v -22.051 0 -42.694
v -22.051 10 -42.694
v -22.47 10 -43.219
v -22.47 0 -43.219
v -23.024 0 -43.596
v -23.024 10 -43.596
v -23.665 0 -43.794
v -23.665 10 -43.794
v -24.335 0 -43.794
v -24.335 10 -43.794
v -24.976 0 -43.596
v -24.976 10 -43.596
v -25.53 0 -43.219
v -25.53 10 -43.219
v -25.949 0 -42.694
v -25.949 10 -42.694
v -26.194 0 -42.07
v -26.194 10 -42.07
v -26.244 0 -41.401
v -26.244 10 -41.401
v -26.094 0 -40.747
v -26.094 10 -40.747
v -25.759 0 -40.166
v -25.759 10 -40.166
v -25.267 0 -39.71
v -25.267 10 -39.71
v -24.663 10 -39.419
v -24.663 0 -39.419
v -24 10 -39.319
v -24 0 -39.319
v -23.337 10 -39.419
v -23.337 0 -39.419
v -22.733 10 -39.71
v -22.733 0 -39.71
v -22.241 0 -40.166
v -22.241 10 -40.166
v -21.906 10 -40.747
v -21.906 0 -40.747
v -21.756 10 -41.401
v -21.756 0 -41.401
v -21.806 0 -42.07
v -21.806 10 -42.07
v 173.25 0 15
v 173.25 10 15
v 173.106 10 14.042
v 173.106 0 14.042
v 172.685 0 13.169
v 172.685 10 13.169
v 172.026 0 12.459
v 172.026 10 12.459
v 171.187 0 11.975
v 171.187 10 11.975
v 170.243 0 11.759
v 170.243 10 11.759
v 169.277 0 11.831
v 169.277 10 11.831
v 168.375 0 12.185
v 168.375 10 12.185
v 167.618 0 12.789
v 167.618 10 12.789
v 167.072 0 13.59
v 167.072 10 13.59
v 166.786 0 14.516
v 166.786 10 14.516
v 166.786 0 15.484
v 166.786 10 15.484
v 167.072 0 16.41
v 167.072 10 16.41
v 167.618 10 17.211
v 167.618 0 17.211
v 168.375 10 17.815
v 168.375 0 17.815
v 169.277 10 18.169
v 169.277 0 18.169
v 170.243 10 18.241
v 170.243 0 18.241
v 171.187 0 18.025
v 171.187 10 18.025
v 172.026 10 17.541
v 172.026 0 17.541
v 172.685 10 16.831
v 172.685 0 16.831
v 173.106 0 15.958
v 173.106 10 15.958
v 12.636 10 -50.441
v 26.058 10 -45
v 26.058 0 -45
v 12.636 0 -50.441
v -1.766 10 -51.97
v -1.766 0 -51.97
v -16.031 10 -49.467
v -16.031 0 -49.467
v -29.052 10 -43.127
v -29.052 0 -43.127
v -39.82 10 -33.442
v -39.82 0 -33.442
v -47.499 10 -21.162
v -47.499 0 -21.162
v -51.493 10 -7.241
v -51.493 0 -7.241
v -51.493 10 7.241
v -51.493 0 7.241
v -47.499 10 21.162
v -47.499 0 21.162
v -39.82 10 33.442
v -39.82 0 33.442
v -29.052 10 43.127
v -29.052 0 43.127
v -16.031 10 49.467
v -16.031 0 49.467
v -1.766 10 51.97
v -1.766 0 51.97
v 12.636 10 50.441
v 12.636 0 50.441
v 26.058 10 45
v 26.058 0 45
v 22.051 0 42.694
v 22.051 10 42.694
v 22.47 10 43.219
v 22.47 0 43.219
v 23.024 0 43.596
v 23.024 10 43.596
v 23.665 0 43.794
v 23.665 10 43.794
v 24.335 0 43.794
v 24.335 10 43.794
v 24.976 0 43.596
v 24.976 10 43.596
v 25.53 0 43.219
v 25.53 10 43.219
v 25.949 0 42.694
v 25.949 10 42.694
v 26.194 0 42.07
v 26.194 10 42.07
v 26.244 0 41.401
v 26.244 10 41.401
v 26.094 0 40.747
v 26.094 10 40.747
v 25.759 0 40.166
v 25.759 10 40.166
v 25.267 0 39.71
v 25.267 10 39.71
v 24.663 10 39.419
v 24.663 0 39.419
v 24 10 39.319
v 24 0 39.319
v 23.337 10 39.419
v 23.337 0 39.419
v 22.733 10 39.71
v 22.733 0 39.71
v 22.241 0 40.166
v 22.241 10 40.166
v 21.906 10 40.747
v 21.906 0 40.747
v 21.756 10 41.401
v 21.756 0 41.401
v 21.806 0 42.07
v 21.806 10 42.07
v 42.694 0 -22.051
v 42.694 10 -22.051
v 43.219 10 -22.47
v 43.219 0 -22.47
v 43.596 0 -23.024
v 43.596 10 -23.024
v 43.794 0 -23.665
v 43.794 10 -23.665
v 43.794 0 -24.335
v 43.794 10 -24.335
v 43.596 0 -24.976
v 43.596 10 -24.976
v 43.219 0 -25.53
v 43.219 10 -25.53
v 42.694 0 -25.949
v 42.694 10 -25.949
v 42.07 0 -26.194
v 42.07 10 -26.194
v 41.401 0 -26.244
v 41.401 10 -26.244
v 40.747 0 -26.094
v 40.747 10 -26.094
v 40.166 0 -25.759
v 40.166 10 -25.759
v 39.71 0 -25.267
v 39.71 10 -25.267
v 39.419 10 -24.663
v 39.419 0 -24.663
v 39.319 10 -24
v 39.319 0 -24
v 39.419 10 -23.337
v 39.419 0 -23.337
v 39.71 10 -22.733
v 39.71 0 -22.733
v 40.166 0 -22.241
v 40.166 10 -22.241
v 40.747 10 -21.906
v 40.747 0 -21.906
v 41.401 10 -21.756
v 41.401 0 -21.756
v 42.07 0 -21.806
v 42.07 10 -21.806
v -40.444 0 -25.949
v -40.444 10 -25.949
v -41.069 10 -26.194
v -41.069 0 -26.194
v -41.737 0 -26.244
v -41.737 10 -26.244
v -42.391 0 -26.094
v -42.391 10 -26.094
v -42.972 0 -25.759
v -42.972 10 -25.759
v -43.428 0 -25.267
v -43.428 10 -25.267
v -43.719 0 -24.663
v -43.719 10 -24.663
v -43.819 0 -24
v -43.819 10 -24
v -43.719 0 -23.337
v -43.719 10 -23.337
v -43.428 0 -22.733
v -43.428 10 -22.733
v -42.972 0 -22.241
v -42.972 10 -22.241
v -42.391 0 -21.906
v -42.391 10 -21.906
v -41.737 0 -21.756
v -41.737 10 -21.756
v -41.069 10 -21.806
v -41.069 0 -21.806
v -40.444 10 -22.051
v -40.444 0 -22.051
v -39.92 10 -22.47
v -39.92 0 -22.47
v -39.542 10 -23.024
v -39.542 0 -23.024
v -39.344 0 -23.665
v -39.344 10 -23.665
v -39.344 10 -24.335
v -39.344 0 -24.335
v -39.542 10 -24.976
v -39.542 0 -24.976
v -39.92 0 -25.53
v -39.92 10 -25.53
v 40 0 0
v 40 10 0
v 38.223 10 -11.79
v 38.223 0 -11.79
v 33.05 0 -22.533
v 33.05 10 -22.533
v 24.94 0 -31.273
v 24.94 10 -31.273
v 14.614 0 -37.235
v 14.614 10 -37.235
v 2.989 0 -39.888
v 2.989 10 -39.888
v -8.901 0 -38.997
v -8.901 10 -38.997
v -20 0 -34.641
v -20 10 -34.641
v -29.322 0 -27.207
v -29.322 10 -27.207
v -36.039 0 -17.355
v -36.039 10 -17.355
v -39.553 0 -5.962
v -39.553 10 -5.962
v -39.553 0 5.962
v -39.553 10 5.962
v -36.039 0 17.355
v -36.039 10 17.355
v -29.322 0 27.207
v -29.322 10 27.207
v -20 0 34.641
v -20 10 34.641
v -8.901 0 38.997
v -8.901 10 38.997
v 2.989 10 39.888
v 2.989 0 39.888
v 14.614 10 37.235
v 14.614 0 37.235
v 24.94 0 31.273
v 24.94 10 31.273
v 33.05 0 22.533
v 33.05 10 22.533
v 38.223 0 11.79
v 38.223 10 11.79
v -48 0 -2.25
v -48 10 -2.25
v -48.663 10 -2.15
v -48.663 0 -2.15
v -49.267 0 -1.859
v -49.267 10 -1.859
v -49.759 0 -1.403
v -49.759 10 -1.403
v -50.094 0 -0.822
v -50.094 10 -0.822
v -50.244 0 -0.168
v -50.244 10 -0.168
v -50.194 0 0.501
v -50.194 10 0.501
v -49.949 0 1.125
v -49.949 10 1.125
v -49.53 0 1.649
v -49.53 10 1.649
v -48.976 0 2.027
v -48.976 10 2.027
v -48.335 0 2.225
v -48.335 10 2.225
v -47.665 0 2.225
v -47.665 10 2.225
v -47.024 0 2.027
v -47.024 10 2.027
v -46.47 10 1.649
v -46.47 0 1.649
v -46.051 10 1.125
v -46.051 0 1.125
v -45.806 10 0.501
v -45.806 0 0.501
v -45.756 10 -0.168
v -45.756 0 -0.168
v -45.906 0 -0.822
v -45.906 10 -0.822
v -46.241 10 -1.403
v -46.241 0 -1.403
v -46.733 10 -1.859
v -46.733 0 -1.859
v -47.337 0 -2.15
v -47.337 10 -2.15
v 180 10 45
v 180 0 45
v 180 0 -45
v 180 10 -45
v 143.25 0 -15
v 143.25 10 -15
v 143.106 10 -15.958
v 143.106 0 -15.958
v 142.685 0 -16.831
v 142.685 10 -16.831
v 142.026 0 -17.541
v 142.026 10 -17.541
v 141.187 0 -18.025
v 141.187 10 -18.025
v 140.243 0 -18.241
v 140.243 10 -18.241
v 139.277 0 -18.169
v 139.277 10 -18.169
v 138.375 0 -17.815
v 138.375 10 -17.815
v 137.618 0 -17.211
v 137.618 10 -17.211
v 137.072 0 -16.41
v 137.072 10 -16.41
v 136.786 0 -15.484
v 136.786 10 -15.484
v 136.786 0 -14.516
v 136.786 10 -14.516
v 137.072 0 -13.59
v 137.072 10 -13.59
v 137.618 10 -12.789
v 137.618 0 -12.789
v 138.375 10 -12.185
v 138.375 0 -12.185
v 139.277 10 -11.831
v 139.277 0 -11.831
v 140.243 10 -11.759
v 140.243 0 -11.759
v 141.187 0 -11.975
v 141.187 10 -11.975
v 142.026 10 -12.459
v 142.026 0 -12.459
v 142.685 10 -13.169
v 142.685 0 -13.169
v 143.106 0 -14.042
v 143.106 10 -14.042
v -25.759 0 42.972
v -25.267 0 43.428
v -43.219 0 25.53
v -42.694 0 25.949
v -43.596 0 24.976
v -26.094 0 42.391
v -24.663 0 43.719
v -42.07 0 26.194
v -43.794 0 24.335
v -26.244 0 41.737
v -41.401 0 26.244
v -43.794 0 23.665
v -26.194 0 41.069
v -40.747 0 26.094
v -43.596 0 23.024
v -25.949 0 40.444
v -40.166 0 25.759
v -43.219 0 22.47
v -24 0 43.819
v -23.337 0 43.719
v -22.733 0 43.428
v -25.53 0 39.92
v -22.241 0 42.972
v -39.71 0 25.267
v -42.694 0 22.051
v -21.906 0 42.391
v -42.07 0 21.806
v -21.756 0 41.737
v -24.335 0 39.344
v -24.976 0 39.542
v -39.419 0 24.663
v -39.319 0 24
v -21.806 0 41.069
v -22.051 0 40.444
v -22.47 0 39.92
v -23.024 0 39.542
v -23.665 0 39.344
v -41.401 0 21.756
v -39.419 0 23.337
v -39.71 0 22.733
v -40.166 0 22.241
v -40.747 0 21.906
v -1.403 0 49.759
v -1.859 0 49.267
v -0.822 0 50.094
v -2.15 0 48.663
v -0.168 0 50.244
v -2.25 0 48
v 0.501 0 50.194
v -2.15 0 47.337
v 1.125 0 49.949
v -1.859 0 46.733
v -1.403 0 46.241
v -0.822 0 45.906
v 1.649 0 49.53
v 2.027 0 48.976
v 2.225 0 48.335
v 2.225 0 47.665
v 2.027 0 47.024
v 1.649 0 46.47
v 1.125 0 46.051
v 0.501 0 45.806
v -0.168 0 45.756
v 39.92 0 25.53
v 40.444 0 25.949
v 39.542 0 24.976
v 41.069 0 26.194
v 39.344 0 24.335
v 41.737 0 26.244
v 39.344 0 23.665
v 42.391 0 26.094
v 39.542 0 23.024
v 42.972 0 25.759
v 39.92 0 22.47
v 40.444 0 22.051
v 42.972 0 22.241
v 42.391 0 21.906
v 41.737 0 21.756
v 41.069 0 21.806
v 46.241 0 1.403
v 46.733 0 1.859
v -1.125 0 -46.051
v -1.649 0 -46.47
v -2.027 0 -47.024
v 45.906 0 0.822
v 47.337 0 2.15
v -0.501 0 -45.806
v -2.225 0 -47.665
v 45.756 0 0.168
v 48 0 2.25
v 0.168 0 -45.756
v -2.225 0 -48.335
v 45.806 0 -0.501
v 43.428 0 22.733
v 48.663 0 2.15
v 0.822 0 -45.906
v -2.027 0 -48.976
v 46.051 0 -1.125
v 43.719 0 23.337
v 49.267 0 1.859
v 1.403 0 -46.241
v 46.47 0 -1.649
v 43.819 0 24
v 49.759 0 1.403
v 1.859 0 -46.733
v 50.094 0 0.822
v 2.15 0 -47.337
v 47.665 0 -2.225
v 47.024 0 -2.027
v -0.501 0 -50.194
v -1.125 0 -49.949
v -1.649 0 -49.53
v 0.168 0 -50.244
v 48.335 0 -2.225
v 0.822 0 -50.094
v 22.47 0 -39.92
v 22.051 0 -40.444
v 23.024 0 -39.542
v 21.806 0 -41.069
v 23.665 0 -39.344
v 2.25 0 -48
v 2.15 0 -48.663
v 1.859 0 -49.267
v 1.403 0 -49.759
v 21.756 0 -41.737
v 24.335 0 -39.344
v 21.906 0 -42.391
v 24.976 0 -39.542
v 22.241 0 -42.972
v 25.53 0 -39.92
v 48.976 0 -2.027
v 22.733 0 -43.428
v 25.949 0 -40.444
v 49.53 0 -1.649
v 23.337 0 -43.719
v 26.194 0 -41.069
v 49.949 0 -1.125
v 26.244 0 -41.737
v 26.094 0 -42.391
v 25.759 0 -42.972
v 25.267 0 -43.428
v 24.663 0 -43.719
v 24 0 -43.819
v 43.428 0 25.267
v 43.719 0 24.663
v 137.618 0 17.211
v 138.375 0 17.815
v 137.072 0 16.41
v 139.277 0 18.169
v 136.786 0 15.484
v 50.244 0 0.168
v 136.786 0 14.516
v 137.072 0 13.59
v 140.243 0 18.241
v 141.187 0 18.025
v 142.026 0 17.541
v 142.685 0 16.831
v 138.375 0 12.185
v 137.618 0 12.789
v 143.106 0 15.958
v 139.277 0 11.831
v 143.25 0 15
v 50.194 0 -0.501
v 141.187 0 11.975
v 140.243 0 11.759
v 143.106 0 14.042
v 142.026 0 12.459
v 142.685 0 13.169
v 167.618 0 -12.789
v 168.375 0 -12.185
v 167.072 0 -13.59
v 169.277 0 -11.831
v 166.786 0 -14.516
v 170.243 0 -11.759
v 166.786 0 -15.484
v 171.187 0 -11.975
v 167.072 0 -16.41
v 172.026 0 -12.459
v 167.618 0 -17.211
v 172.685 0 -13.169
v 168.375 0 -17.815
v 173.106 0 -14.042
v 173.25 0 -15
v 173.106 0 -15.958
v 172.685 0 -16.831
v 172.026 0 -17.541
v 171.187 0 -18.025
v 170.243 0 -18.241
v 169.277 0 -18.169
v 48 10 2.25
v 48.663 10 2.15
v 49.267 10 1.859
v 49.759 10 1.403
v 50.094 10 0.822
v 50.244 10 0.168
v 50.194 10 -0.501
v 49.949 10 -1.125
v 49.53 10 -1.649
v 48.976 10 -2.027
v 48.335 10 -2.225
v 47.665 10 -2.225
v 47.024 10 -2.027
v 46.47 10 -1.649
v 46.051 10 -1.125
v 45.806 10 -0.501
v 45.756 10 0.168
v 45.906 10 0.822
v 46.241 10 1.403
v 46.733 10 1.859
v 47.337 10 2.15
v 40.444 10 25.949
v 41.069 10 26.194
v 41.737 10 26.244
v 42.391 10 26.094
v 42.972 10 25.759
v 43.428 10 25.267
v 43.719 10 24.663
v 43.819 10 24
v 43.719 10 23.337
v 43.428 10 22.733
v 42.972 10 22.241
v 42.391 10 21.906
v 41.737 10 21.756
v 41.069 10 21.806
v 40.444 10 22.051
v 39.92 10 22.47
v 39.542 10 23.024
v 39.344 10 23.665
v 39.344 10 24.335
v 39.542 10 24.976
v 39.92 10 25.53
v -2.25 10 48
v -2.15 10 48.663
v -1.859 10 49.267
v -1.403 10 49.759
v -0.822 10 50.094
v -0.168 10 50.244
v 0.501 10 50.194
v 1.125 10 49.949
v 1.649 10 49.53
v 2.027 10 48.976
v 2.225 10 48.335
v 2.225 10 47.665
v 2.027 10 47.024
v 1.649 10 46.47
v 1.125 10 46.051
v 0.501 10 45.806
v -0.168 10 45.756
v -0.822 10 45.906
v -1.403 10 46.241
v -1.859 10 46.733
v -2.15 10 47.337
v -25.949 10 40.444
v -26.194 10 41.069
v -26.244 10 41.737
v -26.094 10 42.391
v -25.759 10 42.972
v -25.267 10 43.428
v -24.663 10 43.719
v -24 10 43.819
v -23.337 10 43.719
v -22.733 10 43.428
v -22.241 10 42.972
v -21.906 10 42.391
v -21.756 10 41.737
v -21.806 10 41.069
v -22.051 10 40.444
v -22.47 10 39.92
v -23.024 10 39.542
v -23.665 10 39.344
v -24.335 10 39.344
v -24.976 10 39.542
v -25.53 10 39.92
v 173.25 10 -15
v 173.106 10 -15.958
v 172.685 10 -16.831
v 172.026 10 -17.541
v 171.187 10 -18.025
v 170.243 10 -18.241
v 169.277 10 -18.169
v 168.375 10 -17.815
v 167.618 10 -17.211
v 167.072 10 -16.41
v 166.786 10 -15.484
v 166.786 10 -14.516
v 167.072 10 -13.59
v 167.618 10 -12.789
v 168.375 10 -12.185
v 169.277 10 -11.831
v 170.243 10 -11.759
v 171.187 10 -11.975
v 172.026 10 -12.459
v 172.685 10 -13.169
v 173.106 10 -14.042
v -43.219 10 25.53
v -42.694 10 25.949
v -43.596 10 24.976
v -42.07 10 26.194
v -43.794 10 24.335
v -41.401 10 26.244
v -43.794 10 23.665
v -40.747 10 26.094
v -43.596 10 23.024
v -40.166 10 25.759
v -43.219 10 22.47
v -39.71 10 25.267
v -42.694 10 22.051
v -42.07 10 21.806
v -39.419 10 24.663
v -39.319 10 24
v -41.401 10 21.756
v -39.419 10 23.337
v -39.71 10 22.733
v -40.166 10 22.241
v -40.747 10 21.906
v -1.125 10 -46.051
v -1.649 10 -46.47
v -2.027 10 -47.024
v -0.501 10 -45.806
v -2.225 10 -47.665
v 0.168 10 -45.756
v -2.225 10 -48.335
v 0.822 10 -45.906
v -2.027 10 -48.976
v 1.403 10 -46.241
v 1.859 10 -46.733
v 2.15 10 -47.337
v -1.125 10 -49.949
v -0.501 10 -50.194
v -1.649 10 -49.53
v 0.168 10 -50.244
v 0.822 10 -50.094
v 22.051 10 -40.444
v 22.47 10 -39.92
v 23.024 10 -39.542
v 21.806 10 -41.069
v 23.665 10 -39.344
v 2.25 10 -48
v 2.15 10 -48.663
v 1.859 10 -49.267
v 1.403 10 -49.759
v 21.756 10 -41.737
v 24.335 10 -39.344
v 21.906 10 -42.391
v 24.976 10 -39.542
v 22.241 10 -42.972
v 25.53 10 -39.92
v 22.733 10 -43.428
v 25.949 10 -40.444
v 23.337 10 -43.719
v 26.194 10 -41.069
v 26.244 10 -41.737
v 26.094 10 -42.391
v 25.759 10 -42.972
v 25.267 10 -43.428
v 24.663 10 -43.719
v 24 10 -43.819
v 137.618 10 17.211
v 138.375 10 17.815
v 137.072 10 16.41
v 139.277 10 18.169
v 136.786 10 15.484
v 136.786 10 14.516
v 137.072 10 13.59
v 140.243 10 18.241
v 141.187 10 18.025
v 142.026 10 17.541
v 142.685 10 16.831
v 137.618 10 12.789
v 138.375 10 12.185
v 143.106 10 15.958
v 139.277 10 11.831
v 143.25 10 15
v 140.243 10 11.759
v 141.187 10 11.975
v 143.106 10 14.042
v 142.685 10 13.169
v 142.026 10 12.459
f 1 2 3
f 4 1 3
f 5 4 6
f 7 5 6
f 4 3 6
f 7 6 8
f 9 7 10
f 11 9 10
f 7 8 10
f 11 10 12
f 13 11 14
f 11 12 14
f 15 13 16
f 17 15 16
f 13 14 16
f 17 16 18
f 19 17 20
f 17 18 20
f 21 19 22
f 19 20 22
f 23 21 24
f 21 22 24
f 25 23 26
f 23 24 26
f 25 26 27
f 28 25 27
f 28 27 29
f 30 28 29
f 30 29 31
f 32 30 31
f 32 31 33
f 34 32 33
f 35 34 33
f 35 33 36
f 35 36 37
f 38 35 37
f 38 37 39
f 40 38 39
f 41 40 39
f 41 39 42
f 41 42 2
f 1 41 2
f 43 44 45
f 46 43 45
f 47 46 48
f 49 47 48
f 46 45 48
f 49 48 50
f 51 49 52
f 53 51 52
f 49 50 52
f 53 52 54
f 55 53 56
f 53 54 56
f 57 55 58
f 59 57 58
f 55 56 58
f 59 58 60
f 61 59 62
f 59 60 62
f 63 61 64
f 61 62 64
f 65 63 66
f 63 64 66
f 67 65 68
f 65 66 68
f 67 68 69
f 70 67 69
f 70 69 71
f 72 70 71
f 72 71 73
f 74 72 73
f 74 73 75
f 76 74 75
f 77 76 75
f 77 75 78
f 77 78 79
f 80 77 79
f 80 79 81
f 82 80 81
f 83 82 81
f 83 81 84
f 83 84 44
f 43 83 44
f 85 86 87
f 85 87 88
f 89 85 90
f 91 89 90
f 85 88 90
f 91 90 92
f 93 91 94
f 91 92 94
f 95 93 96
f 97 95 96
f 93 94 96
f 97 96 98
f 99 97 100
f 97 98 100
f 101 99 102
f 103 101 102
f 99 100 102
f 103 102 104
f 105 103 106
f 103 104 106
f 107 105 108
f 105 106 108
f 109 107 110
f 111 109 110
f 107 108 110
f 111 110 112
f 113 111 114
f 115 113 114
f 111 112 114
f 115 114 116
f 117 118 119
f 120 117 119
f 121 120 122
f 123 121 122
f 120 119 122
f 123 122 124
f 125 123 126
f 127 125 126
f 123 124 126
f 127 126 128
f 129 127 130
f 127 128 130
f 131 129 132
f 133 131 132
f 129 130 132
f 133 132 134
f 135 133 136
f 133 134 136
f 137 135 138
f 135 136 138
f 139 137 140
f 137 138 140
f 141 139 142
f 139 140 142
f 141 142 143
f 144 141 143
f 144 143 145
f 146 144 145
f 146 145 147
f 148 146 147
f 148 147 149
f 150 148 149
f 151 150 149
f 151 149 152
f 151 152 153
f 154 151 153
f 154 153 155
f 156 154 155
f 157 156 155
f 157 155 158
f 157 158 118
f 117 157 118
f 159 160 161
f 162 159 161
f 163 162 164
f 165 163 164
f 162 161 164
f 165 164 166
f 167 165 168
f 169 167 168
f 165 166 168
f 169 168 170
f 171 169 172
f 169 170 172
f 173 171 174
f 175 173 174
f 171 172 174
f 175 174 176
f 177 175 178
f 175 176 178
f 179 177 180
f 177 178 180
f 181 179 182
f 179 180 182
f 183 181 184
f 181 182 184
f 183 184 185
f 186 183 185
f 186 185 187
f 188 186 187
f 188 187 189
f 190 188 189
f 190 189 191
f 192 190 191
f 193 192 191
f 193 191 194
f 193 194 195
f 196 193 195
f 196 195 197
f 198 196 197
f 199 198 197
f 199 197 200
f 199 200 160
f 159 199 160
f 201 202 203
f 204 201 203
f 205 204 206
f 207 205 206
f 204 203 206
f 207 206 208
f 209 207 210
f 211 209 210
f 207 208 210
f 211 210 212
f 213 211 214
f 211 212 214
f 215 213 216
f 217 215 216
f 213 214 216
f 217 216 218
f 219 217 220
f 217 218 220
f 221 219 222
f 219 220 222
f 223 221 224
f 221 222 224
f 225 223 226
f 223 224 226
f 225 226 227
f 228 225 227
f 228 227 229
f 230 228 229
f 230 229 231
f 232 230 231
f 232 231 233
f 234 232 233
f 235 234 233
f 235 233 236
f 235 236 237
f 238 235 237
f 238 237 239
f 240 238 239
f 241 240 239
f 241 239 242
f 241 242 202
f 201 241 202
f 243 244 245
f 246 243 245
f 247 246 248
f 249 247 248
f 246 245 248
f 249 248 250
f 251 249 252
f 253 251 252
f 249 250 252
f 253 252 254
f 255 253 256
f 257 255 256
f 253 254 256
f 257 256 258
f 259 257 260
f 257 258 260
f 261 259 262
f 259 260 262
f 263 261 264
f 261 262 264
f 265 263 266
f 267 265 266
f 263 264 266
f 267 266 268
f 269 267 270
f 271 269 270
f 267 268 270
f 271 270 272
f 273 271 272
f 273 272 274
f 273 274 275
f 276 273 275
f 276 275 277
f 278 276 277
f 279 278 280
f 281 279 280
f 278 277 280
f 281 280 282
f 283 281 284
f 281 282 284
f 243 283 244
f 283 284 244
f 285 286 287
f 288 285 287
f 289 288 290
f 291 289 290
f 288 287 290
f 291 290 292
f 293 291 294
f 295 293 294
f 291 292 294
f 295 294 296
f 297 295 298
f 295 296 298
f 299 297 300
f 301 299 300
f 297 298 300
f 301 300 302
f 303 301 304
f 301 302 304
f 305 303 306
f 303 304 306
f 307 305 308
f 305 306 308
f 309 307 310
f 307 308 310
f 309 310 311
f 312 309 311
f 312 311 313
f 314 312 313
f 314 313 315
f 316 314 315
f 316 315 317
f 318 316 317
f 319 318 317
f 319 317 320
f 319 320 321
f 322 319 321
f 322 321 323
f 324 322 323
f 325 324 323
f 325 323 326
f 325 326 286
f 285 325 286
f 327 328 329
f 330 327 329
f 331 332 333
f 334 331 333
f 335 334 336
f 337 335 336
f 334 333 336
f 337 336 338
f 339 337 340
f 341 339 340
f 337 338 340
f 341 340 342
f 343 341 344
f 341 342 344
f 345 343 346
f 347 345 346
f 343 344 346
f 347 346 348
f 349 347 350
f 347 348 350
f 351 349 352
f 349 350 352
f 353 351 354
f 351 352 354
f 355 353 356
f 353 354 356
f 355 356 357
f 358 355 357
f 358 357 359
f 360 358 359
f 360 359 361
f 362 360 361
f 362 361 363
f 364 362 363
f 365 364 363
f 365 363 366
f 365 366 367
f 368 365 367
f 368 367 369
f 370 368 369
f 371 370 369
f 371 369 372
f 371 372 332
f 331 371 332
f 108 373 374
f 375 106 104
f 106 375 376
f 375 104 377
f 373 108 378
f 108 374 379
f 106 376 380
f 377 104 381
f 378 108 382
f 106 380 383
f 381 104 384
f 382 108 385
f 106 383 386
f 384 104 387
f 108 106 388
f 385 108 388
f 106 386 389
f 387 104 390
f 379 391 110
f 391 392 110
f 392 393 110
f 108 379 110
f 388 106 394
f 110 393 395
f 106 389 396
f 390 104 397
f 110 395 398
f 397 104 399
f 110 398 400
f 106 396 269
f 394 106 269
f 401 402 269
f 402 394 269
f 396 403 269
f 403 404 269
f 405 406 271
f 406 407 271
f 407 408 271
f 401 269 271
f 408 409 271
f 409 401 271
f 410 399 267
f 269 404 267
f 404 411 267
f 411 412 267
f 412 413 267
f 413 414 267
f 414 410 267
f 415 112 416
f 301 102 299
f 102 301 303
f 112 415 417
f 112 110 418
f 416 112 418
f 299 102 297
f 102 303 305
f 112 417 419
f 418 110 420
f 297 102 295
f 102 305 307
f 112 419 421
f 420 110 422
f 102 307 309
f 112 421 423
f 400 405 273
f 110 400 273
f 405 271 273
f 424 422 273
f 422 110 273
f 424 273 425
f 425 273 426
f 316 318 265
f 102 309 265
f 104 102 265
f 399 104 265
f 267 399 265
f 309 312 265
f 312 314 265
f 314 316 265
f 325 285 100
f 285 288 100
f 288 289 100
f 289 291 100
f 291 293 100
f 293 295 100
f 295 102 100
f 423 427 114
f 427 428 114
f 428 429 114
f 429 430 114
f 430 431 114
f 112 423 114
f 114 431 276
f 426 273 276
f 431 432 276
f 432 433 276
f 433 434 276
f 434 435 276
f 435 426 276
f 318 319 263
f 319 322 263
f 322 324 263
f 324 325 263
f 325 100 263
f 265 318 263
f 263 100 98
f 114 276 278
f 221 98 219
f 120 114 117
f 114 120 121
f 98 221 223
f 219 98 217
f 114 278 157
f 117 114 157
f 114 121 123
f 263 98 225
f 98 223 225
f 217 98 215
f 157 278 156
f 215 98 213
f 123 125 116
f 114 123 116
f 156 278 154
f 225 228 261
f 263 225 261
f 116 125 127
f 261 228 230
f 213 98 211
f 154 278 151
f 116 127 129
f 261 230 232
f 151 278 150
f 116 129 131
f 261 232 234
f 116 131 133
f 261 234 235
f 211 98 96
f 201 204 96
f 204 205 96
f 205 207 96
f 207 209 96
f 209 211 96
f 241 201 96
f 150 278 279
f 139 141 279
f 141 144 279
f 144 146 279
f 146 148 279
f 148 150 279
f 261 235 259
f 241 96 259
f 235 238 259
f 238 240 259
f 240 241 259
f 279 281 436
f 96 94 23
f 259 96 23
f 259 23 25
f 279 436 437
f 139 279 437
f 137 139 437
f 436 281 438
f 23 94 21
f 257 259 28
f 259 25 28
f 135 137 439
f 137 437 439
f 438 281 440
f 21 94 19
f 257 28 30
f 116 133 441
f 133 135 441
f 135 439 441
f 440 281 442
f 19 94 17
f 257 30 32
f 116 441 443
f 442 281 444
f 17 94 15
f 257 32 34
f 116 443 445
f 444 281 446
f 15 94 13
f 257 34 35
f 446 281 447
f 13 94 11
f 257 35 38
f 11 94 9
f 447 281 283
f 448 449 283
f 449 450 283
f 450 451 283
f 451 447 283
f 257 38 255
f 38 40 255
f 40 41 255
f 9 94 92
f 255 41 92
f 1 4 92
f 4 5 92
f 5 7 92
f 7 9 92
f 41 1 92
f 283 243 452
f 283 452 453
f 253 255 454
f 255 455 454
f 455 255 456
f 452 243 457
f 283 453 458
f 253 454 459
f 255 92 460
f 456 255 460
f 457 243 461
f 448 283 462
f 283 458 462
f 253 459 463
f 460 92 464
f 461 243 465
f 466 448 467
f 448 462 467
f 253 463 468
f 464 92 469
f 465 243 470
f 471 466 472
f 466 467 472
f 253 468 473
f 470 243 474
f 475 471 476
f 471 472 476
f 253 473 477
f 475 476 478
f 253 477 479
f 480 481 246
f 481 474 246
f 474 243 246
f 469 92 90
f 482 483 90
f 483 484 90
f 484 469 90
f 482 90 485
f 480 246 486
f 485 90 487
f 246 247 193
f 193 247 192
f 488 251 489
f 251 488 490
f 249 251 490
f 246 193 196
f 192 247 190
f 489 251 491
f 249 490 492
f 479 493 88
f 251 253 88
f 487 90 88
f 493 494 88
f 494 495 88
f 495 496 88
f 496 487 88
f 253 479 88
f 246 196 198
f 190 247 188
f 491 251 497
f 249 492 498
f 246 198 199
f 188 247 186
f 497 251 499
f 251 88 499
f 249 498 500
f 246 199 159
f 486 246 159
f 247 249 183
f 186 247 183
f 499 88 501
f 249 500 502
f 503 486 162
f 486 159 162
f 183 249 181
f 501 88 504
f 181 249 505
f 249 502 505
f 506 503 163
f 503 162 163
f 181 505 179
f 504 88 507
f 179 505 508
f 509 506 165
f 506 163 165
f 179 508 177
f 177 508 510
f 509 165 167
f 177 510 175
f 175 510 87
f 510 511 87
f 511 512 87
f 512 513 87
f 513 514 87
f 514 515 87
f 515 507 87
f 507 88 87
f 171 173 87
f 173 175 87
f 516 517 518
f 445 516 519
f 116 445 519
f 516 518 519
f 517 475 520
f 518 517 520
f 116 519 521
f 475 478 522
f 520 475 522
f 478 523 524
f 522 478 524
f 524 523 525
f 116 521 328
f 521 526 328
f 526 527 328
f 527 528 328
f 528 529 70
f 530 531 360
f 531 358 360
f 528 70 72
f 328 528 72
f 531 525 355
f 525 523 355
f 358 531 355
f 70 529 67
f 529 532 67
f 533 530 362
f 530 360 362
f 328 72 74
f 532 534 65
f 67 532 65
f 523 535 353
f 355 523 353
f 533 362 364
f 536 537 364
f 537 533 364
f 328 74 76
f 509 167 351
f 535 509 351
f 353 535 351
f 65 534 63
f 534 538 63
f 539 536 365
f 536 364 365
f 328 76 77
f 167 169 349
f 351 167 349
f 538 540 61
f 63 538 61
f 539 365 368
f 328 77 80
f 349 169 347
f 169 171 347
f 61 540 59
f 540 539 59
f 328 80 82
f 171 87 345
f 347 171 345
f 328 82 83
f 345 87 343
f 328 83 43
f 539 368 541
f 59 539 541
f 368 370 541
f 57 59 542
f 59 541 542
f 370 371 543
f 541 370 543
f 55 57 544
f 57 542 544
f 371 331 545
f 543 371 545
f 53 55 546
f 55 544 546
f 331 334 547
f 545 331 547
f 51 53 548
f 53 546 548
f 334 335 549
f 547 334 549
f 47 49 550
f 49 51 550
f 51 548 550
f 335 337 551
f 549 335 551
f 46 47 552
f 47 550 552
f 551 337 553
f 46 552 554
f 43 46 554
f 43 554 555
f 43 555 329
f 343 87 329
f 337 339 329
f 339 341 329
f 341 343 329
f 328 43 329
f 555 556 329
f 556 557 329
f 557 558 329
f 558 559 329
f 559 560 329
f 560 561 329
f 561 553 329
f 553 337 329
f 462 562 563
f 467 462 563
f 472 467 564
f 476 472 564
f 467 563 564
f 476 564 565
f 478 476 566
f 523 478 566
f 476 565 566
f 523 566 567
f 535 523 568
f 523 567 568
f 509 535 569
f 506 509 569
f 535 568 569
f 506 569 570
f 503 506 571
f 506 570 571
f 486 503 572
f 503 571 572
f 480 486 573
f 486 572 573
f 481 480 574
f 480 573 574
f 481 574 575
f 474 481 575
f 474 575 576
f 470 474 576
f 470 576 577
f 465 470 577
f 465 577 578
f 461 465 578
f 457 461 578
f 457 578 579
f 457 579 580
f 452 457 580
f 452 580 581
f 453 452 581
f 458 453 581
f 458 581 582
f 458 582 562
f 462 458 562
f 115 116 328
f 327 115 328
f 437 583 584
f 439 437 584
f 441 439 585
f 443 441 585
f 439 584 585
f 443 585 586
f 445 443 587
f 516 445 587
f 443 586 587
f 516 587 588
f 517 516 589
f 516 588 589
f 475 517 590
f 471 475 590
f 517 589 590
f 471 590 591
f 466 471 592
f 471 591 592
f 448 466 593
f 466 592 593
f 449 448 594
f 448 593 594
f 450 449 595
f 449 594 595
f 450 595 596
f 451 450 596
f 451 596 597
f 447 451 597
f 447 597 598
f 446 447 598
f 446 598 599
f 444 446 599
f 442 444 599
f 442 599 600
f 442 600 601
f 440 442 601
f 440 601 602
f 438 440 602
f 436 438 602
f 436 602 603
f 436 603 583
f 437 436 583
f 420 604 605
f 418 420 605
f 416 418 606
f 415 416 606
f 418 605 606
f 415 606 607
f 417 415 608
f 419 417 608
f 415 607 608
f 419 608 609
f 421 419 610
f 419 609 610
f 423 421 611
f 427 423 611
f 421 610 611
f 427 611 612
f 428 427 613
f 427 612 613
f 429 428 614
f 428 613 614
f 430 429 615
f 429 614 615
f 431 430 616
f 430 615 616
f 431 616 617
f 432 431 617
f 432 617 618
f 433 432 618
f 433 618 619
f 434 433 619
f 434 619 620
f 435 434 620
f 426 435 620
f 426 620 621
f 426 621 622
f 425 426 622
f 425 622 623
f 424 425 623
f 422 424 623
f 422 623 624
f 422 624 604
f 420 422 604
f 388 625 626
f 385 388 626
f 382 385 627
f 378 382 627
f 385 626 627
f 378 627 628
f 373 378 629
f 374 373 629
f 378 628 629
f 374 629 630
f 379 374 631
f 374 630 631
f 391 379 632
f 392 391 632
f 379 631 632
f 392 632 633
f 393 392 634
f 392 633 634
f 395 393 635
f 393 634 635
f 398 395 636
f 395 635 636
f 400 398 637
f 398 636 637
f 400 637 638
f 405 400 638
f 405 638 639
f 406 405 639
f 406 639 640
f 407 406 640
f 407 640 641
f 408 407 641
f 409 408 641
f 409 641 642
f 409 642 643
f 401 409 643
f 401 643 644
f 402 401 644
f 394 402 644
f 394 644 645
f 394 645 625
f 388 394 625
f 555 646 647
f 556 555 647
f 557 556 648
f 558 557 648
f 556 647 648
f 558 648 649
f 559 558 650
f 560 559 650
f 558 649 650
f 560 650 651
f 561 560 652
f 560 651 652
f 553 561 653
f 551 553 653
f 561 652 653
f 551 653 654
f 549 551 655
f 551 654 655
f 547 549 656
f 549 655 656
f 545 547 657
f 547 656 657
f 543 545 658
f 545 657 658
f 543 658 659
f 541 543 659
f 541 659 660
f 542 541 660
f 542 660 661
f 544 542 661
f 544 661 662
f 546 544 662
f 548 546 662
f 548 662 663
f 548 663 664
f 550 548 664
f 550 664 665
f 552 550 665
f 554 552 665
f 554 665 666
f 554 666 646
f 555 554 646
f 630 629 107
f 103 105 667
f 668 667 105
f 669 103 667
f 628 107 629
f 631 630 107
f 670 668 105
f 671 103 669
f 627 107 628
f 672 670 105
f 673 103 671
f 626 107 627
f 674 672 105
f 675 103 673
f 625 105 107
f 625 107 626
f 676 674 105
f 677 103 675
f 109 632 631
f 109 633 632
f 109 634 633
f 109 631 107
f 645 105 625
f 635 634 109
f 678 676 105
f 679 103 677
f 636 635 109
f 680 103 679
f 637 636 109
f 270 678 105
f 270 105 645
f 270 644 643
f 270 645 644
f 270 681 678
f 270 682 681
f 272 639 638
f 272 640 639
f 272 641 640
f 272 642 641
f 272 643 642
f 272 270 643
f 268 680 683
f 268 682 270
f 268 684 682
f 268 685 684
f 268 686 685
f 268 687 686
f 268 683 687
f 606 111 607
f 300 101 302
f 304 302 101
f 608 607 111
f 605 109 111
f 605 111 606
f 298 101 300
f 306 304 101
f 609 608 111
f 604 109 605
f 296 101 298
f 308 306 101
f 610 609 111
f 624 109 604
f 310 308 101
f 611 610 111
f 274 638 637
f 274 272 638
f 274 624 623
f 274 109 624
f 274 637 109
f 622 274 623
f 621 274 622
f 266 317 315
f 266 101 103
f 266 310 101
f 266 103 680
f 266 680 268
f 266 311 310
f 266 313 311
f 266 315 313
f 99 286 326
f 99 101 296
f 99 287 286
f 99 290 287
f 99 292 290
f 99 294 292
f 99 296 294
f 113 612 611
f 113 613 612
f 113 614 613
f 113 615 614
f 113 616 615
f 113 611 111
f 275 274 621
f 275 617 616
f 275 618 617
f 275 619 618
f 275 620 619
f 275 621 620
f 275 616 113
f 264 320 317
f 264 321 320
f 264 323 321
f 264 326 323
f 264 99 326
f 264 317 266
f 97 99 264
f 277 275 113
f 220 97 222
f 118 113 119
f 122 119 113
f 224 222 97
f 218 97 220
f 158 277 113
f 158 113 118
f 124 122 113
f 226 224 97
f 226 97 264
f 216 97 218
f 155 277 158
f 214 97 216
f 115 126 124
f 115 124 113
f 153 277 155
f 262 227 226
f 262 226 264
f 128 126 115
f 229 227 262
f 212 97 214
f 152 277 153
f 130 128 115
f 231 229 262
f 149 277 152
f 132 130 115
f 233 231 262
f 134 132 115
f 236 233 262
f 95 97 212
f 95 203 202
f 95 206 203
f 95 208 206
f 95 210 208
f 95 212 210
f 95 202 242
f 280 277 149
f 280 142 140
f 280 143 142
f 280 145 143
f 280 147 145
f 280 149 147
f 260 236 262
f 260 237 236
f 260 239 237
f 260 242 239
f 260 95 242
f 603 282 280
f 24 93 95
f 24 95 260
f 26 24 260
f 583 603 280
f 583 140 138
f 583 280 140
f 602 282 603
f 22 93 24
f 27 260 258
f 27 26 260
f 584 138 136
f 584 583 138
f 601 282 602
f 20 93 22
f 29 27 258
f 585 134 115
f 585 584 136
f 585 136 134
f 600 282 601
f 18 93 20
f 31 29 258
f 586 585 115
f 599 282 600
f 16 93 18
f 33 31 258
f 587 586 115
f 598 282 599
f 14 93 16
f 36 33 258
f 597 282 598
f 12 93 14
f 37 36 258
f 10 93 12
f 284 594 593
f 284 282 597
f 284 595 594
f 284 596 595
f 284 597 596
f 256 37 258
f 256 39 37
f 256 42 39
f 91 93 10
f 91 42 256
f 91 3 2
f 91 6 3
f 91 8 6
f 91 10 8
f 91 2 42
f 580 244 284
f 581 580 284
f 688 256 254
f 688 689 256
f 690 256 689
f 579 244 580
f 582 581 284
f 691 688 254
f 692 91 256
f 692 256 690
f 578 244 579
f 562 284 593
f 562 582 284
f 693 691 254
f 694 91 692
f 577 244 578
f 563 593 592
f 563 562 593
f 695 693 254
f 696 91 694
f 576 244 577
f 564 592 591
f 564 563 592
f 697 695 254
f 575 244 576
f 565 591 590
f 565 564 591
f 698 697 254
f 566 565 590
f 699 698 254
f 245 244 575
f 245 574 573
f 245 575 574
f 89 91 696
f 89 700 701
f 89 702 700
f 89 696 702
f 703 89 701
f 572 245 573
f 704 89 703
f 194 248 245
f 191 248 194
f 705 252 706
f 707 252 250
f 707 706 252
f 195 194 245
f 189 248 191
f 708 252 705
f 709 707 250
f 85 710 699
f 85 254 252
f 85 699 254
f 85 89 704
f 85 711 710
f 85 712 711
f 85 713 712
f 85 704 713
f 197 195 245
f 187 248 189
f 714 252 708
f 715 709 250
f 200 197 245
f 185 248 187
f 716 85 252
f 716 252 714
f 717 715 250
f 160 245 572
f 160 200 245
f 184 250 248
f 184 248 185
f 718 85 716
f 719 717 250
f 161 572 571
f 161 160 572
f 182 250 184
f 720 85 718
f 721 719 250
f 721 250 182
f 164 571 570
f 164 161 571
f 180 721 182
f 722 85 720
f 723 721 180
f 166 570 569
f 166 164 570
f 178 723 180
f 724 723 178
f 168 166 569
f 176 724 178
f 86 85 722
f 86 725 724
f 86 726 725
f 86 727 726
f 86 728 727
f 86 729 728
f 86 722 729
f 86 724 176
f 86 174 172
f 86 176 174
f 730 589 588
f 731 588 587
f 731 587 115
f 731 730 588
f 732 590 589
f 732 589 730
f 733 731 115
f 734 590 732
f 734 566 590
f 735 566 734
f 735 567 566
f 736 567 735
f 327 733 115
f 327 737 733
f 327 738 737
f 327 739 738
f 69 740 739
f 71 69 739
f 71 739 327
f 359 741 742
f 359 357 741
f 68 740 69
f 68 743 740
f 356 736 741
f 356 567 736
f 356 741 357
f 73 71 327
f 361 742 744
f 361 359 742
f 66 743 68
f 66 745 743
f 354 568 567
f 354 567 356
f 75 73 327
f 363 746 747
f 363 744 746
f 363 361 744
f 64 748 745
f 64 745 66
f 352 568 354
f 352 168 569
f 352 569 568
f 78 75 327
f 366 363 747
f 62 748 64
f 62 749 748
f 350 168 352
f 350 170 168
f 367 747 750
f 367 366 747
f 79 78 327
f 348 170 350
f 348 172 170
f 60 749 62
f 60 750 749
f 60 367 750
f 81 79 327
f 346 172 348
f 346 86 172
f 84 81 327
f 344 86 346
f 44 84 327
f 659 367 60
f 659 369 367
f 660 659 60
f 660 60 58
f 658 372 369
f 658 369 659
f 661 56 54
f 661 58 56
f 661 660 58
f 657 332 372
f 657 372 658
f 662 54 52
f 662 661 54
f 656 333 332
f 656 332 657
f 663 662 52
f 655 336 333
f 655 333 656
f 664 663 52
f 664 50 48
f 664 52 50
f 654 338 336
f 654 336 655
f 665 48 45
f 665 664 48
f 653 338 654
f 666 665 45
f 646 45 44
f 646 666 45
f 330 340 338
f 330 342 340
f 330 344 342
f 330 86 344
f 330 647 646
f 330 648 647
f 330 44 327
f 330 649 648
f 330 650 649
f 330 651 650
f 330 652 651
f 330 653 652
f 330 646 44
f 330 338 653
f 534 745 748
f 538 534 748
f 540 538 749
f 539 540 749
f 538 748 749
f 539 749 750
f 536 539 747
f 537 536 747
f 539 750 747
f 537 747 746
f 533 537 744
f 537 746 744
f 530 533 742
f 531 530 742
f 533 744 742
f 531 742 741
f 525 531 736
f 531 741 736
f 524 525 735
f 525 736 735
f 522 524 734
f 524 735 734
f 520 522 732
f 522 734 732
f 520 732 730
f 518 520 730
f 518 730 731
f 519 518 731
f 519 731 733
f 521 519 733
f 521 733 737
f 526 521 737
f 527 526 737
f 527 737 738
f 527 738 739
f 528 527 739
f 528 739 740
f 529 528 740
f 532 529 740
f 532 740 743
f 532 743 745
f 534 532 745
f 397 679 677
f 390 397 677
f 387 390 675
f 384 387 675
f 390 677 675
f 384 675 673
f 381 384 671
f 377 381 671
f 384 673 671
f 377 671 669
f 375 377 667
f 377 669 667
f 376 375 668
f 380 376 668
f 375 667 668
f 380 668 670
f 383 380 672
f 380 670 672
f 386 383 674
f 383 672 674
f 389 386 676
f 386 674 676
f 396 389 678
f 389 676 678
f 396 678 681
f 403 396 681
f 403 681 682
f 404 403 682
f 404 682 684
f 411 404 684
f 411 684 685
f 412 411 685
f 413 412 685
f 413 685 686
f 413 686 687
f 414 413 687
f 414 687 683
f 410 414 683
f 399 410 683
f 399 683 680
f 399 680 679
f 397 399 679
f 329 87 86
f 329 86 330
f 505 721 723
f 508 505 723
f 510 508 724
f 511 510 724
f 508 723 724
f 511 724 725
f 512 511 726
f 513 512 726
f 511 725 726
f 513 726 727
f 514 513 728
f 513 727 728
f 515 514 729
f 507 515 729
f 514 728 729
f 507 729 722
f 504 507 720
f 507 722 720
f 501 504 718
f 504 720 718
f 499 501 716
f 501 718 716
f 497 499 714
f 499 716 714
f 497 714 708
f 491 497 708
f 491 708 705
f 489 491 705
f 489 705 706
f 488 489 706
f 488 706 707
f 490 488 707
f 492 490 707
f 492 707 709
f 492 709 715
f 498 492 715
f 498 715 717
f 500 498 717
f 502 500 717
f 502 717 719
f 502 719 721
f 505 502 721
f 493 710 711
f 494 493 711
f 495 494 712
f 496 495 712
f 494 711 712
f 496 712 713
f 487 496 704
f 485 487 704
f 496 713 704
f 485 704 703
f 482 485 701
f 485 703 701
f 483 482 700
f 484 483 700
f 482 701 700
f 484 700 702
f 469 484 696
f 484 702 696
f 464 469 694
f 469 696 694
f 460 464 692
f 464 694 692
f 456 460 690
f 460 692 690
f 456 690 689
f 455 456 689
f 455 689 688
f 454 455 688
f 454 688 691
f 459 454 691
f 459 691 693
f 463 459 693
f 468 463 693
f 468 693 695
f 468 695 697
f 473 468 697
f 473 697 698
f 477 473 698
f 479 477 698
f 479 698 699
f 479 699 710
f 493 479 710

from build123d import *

# Parameters (mm, degrees)
SKETCH1_R            = 52
BOSS_EXTRUDE1_DEPTH  = 10
SKETCH2_W            = 180
SKETCH2_H            = 90
BOSS_EXTRUDE2_DEPTH  = 10
SKETCH3_R            = 40
CUT_EXTRUDE1_DEPTH   = 10
SKETCH4_R            = 2.25
CUT_EXTRUDE2_DEPTH   = 11
CIRPATTERN1_COUNT    = 12
SKETCH5_R            = 3.25
CUT_EXTRUDE3_DEPTH   = 11
LPATTERN1_COUNT      = 2
LPATTERN1_PITCH      = 30
LPATTERN1_COUNT_DIR2 = 2
LPATTERN1_PITCH_DIR2 = 30


with BuildPart() as part:
    # Sketch1 → Boss-Extrude1 (new body)
    with BuildSketch(Plane(origin=(0, 0, 0), x_dir=(1, 0, 0), z_dir=(0, 1, 0))):
        Circle(SKETCH1_R)
    extrude(amount=BOSS_EXTRUDE1_DEPTH)

    # Sketch2 → Boss-Extrude2 (add)
    with BuildSketch(Plane(origin=(0, 0, 0), x_dir=(1, 0, 0), z_dir=(0, 1, 0))):
        with Locations((90, 0)):
            Rectangle(SKETCH2_W, SKETCH2_H)
    extrude(amount=BOSS_EXTRUDE2_DEPTH)

    # Sketch3 → Cut-Extrude1 (cut)
    with BuildSketch(Plane(origin=(0, 10, 0), x_dir=(1, 0, 0), z_dir=(0, 1, 0))):
        Circle(SKETCH3_R)
    extrude(amount=-CUT_EXTRUDE1_DEPTH, mode=Mode.SUBTRACT)

    # Sketch4 → Cut-Extrude2 (cut, through all)
    with BuildSketch(Plane(origin=(0, 10, 0), x_dir=(1, 0, 0), z_dir=(0, 1, 0))):
        with Locations((0, 48)):
            Circle(SKETCH4_R)
    cut_extrude2 = extrude(amount=-CUT_EXTRUDE2_DEPTH, mode=Mode.SUBTRACT)

    # CirPattern1: Cut-Extrude2 ×12 about axis
    cirpattern1_axis = Axis((0, 0, 0), (0, 1, 0))
    for i in range(1, CIRPATTERN1_COUNT):
        add(cut_extrude2.rotate(cirpattern1_axis, i * 360 / CIRPATTERN1_COUNT), mode=Mode.SUBTRACT)

    # Sketch5 → Cut-Extrude3 (cut, through all)
    with BuildSketch(Plane(origin=(0, 10, 0), x_dir=(1, 0, 0), z_dir=(0, 1, 0))):
        with Locations((170, 15)):
            Circle(SKETCH5_R)
    cut_extrude3 = extrude(amount=-CUT_EXTRUDE3_DEPTH, mode=Mode.SUBTRACT)

    # LPattern1: Cut-Extrude3 2 × 2
    with Locations(*[(-i * LPATTERN1_PITCH, 0, j * LPATTERN1_PITCH_DIR2) for i in range(LPATTERN1_COUNT) for j in range(LPATTERN1_COUNT_DIR2) if (i, j) != (0, 0)]):
        add(cut_extrude3, mode=Mode.SUBTRACT)


solid = part.part
